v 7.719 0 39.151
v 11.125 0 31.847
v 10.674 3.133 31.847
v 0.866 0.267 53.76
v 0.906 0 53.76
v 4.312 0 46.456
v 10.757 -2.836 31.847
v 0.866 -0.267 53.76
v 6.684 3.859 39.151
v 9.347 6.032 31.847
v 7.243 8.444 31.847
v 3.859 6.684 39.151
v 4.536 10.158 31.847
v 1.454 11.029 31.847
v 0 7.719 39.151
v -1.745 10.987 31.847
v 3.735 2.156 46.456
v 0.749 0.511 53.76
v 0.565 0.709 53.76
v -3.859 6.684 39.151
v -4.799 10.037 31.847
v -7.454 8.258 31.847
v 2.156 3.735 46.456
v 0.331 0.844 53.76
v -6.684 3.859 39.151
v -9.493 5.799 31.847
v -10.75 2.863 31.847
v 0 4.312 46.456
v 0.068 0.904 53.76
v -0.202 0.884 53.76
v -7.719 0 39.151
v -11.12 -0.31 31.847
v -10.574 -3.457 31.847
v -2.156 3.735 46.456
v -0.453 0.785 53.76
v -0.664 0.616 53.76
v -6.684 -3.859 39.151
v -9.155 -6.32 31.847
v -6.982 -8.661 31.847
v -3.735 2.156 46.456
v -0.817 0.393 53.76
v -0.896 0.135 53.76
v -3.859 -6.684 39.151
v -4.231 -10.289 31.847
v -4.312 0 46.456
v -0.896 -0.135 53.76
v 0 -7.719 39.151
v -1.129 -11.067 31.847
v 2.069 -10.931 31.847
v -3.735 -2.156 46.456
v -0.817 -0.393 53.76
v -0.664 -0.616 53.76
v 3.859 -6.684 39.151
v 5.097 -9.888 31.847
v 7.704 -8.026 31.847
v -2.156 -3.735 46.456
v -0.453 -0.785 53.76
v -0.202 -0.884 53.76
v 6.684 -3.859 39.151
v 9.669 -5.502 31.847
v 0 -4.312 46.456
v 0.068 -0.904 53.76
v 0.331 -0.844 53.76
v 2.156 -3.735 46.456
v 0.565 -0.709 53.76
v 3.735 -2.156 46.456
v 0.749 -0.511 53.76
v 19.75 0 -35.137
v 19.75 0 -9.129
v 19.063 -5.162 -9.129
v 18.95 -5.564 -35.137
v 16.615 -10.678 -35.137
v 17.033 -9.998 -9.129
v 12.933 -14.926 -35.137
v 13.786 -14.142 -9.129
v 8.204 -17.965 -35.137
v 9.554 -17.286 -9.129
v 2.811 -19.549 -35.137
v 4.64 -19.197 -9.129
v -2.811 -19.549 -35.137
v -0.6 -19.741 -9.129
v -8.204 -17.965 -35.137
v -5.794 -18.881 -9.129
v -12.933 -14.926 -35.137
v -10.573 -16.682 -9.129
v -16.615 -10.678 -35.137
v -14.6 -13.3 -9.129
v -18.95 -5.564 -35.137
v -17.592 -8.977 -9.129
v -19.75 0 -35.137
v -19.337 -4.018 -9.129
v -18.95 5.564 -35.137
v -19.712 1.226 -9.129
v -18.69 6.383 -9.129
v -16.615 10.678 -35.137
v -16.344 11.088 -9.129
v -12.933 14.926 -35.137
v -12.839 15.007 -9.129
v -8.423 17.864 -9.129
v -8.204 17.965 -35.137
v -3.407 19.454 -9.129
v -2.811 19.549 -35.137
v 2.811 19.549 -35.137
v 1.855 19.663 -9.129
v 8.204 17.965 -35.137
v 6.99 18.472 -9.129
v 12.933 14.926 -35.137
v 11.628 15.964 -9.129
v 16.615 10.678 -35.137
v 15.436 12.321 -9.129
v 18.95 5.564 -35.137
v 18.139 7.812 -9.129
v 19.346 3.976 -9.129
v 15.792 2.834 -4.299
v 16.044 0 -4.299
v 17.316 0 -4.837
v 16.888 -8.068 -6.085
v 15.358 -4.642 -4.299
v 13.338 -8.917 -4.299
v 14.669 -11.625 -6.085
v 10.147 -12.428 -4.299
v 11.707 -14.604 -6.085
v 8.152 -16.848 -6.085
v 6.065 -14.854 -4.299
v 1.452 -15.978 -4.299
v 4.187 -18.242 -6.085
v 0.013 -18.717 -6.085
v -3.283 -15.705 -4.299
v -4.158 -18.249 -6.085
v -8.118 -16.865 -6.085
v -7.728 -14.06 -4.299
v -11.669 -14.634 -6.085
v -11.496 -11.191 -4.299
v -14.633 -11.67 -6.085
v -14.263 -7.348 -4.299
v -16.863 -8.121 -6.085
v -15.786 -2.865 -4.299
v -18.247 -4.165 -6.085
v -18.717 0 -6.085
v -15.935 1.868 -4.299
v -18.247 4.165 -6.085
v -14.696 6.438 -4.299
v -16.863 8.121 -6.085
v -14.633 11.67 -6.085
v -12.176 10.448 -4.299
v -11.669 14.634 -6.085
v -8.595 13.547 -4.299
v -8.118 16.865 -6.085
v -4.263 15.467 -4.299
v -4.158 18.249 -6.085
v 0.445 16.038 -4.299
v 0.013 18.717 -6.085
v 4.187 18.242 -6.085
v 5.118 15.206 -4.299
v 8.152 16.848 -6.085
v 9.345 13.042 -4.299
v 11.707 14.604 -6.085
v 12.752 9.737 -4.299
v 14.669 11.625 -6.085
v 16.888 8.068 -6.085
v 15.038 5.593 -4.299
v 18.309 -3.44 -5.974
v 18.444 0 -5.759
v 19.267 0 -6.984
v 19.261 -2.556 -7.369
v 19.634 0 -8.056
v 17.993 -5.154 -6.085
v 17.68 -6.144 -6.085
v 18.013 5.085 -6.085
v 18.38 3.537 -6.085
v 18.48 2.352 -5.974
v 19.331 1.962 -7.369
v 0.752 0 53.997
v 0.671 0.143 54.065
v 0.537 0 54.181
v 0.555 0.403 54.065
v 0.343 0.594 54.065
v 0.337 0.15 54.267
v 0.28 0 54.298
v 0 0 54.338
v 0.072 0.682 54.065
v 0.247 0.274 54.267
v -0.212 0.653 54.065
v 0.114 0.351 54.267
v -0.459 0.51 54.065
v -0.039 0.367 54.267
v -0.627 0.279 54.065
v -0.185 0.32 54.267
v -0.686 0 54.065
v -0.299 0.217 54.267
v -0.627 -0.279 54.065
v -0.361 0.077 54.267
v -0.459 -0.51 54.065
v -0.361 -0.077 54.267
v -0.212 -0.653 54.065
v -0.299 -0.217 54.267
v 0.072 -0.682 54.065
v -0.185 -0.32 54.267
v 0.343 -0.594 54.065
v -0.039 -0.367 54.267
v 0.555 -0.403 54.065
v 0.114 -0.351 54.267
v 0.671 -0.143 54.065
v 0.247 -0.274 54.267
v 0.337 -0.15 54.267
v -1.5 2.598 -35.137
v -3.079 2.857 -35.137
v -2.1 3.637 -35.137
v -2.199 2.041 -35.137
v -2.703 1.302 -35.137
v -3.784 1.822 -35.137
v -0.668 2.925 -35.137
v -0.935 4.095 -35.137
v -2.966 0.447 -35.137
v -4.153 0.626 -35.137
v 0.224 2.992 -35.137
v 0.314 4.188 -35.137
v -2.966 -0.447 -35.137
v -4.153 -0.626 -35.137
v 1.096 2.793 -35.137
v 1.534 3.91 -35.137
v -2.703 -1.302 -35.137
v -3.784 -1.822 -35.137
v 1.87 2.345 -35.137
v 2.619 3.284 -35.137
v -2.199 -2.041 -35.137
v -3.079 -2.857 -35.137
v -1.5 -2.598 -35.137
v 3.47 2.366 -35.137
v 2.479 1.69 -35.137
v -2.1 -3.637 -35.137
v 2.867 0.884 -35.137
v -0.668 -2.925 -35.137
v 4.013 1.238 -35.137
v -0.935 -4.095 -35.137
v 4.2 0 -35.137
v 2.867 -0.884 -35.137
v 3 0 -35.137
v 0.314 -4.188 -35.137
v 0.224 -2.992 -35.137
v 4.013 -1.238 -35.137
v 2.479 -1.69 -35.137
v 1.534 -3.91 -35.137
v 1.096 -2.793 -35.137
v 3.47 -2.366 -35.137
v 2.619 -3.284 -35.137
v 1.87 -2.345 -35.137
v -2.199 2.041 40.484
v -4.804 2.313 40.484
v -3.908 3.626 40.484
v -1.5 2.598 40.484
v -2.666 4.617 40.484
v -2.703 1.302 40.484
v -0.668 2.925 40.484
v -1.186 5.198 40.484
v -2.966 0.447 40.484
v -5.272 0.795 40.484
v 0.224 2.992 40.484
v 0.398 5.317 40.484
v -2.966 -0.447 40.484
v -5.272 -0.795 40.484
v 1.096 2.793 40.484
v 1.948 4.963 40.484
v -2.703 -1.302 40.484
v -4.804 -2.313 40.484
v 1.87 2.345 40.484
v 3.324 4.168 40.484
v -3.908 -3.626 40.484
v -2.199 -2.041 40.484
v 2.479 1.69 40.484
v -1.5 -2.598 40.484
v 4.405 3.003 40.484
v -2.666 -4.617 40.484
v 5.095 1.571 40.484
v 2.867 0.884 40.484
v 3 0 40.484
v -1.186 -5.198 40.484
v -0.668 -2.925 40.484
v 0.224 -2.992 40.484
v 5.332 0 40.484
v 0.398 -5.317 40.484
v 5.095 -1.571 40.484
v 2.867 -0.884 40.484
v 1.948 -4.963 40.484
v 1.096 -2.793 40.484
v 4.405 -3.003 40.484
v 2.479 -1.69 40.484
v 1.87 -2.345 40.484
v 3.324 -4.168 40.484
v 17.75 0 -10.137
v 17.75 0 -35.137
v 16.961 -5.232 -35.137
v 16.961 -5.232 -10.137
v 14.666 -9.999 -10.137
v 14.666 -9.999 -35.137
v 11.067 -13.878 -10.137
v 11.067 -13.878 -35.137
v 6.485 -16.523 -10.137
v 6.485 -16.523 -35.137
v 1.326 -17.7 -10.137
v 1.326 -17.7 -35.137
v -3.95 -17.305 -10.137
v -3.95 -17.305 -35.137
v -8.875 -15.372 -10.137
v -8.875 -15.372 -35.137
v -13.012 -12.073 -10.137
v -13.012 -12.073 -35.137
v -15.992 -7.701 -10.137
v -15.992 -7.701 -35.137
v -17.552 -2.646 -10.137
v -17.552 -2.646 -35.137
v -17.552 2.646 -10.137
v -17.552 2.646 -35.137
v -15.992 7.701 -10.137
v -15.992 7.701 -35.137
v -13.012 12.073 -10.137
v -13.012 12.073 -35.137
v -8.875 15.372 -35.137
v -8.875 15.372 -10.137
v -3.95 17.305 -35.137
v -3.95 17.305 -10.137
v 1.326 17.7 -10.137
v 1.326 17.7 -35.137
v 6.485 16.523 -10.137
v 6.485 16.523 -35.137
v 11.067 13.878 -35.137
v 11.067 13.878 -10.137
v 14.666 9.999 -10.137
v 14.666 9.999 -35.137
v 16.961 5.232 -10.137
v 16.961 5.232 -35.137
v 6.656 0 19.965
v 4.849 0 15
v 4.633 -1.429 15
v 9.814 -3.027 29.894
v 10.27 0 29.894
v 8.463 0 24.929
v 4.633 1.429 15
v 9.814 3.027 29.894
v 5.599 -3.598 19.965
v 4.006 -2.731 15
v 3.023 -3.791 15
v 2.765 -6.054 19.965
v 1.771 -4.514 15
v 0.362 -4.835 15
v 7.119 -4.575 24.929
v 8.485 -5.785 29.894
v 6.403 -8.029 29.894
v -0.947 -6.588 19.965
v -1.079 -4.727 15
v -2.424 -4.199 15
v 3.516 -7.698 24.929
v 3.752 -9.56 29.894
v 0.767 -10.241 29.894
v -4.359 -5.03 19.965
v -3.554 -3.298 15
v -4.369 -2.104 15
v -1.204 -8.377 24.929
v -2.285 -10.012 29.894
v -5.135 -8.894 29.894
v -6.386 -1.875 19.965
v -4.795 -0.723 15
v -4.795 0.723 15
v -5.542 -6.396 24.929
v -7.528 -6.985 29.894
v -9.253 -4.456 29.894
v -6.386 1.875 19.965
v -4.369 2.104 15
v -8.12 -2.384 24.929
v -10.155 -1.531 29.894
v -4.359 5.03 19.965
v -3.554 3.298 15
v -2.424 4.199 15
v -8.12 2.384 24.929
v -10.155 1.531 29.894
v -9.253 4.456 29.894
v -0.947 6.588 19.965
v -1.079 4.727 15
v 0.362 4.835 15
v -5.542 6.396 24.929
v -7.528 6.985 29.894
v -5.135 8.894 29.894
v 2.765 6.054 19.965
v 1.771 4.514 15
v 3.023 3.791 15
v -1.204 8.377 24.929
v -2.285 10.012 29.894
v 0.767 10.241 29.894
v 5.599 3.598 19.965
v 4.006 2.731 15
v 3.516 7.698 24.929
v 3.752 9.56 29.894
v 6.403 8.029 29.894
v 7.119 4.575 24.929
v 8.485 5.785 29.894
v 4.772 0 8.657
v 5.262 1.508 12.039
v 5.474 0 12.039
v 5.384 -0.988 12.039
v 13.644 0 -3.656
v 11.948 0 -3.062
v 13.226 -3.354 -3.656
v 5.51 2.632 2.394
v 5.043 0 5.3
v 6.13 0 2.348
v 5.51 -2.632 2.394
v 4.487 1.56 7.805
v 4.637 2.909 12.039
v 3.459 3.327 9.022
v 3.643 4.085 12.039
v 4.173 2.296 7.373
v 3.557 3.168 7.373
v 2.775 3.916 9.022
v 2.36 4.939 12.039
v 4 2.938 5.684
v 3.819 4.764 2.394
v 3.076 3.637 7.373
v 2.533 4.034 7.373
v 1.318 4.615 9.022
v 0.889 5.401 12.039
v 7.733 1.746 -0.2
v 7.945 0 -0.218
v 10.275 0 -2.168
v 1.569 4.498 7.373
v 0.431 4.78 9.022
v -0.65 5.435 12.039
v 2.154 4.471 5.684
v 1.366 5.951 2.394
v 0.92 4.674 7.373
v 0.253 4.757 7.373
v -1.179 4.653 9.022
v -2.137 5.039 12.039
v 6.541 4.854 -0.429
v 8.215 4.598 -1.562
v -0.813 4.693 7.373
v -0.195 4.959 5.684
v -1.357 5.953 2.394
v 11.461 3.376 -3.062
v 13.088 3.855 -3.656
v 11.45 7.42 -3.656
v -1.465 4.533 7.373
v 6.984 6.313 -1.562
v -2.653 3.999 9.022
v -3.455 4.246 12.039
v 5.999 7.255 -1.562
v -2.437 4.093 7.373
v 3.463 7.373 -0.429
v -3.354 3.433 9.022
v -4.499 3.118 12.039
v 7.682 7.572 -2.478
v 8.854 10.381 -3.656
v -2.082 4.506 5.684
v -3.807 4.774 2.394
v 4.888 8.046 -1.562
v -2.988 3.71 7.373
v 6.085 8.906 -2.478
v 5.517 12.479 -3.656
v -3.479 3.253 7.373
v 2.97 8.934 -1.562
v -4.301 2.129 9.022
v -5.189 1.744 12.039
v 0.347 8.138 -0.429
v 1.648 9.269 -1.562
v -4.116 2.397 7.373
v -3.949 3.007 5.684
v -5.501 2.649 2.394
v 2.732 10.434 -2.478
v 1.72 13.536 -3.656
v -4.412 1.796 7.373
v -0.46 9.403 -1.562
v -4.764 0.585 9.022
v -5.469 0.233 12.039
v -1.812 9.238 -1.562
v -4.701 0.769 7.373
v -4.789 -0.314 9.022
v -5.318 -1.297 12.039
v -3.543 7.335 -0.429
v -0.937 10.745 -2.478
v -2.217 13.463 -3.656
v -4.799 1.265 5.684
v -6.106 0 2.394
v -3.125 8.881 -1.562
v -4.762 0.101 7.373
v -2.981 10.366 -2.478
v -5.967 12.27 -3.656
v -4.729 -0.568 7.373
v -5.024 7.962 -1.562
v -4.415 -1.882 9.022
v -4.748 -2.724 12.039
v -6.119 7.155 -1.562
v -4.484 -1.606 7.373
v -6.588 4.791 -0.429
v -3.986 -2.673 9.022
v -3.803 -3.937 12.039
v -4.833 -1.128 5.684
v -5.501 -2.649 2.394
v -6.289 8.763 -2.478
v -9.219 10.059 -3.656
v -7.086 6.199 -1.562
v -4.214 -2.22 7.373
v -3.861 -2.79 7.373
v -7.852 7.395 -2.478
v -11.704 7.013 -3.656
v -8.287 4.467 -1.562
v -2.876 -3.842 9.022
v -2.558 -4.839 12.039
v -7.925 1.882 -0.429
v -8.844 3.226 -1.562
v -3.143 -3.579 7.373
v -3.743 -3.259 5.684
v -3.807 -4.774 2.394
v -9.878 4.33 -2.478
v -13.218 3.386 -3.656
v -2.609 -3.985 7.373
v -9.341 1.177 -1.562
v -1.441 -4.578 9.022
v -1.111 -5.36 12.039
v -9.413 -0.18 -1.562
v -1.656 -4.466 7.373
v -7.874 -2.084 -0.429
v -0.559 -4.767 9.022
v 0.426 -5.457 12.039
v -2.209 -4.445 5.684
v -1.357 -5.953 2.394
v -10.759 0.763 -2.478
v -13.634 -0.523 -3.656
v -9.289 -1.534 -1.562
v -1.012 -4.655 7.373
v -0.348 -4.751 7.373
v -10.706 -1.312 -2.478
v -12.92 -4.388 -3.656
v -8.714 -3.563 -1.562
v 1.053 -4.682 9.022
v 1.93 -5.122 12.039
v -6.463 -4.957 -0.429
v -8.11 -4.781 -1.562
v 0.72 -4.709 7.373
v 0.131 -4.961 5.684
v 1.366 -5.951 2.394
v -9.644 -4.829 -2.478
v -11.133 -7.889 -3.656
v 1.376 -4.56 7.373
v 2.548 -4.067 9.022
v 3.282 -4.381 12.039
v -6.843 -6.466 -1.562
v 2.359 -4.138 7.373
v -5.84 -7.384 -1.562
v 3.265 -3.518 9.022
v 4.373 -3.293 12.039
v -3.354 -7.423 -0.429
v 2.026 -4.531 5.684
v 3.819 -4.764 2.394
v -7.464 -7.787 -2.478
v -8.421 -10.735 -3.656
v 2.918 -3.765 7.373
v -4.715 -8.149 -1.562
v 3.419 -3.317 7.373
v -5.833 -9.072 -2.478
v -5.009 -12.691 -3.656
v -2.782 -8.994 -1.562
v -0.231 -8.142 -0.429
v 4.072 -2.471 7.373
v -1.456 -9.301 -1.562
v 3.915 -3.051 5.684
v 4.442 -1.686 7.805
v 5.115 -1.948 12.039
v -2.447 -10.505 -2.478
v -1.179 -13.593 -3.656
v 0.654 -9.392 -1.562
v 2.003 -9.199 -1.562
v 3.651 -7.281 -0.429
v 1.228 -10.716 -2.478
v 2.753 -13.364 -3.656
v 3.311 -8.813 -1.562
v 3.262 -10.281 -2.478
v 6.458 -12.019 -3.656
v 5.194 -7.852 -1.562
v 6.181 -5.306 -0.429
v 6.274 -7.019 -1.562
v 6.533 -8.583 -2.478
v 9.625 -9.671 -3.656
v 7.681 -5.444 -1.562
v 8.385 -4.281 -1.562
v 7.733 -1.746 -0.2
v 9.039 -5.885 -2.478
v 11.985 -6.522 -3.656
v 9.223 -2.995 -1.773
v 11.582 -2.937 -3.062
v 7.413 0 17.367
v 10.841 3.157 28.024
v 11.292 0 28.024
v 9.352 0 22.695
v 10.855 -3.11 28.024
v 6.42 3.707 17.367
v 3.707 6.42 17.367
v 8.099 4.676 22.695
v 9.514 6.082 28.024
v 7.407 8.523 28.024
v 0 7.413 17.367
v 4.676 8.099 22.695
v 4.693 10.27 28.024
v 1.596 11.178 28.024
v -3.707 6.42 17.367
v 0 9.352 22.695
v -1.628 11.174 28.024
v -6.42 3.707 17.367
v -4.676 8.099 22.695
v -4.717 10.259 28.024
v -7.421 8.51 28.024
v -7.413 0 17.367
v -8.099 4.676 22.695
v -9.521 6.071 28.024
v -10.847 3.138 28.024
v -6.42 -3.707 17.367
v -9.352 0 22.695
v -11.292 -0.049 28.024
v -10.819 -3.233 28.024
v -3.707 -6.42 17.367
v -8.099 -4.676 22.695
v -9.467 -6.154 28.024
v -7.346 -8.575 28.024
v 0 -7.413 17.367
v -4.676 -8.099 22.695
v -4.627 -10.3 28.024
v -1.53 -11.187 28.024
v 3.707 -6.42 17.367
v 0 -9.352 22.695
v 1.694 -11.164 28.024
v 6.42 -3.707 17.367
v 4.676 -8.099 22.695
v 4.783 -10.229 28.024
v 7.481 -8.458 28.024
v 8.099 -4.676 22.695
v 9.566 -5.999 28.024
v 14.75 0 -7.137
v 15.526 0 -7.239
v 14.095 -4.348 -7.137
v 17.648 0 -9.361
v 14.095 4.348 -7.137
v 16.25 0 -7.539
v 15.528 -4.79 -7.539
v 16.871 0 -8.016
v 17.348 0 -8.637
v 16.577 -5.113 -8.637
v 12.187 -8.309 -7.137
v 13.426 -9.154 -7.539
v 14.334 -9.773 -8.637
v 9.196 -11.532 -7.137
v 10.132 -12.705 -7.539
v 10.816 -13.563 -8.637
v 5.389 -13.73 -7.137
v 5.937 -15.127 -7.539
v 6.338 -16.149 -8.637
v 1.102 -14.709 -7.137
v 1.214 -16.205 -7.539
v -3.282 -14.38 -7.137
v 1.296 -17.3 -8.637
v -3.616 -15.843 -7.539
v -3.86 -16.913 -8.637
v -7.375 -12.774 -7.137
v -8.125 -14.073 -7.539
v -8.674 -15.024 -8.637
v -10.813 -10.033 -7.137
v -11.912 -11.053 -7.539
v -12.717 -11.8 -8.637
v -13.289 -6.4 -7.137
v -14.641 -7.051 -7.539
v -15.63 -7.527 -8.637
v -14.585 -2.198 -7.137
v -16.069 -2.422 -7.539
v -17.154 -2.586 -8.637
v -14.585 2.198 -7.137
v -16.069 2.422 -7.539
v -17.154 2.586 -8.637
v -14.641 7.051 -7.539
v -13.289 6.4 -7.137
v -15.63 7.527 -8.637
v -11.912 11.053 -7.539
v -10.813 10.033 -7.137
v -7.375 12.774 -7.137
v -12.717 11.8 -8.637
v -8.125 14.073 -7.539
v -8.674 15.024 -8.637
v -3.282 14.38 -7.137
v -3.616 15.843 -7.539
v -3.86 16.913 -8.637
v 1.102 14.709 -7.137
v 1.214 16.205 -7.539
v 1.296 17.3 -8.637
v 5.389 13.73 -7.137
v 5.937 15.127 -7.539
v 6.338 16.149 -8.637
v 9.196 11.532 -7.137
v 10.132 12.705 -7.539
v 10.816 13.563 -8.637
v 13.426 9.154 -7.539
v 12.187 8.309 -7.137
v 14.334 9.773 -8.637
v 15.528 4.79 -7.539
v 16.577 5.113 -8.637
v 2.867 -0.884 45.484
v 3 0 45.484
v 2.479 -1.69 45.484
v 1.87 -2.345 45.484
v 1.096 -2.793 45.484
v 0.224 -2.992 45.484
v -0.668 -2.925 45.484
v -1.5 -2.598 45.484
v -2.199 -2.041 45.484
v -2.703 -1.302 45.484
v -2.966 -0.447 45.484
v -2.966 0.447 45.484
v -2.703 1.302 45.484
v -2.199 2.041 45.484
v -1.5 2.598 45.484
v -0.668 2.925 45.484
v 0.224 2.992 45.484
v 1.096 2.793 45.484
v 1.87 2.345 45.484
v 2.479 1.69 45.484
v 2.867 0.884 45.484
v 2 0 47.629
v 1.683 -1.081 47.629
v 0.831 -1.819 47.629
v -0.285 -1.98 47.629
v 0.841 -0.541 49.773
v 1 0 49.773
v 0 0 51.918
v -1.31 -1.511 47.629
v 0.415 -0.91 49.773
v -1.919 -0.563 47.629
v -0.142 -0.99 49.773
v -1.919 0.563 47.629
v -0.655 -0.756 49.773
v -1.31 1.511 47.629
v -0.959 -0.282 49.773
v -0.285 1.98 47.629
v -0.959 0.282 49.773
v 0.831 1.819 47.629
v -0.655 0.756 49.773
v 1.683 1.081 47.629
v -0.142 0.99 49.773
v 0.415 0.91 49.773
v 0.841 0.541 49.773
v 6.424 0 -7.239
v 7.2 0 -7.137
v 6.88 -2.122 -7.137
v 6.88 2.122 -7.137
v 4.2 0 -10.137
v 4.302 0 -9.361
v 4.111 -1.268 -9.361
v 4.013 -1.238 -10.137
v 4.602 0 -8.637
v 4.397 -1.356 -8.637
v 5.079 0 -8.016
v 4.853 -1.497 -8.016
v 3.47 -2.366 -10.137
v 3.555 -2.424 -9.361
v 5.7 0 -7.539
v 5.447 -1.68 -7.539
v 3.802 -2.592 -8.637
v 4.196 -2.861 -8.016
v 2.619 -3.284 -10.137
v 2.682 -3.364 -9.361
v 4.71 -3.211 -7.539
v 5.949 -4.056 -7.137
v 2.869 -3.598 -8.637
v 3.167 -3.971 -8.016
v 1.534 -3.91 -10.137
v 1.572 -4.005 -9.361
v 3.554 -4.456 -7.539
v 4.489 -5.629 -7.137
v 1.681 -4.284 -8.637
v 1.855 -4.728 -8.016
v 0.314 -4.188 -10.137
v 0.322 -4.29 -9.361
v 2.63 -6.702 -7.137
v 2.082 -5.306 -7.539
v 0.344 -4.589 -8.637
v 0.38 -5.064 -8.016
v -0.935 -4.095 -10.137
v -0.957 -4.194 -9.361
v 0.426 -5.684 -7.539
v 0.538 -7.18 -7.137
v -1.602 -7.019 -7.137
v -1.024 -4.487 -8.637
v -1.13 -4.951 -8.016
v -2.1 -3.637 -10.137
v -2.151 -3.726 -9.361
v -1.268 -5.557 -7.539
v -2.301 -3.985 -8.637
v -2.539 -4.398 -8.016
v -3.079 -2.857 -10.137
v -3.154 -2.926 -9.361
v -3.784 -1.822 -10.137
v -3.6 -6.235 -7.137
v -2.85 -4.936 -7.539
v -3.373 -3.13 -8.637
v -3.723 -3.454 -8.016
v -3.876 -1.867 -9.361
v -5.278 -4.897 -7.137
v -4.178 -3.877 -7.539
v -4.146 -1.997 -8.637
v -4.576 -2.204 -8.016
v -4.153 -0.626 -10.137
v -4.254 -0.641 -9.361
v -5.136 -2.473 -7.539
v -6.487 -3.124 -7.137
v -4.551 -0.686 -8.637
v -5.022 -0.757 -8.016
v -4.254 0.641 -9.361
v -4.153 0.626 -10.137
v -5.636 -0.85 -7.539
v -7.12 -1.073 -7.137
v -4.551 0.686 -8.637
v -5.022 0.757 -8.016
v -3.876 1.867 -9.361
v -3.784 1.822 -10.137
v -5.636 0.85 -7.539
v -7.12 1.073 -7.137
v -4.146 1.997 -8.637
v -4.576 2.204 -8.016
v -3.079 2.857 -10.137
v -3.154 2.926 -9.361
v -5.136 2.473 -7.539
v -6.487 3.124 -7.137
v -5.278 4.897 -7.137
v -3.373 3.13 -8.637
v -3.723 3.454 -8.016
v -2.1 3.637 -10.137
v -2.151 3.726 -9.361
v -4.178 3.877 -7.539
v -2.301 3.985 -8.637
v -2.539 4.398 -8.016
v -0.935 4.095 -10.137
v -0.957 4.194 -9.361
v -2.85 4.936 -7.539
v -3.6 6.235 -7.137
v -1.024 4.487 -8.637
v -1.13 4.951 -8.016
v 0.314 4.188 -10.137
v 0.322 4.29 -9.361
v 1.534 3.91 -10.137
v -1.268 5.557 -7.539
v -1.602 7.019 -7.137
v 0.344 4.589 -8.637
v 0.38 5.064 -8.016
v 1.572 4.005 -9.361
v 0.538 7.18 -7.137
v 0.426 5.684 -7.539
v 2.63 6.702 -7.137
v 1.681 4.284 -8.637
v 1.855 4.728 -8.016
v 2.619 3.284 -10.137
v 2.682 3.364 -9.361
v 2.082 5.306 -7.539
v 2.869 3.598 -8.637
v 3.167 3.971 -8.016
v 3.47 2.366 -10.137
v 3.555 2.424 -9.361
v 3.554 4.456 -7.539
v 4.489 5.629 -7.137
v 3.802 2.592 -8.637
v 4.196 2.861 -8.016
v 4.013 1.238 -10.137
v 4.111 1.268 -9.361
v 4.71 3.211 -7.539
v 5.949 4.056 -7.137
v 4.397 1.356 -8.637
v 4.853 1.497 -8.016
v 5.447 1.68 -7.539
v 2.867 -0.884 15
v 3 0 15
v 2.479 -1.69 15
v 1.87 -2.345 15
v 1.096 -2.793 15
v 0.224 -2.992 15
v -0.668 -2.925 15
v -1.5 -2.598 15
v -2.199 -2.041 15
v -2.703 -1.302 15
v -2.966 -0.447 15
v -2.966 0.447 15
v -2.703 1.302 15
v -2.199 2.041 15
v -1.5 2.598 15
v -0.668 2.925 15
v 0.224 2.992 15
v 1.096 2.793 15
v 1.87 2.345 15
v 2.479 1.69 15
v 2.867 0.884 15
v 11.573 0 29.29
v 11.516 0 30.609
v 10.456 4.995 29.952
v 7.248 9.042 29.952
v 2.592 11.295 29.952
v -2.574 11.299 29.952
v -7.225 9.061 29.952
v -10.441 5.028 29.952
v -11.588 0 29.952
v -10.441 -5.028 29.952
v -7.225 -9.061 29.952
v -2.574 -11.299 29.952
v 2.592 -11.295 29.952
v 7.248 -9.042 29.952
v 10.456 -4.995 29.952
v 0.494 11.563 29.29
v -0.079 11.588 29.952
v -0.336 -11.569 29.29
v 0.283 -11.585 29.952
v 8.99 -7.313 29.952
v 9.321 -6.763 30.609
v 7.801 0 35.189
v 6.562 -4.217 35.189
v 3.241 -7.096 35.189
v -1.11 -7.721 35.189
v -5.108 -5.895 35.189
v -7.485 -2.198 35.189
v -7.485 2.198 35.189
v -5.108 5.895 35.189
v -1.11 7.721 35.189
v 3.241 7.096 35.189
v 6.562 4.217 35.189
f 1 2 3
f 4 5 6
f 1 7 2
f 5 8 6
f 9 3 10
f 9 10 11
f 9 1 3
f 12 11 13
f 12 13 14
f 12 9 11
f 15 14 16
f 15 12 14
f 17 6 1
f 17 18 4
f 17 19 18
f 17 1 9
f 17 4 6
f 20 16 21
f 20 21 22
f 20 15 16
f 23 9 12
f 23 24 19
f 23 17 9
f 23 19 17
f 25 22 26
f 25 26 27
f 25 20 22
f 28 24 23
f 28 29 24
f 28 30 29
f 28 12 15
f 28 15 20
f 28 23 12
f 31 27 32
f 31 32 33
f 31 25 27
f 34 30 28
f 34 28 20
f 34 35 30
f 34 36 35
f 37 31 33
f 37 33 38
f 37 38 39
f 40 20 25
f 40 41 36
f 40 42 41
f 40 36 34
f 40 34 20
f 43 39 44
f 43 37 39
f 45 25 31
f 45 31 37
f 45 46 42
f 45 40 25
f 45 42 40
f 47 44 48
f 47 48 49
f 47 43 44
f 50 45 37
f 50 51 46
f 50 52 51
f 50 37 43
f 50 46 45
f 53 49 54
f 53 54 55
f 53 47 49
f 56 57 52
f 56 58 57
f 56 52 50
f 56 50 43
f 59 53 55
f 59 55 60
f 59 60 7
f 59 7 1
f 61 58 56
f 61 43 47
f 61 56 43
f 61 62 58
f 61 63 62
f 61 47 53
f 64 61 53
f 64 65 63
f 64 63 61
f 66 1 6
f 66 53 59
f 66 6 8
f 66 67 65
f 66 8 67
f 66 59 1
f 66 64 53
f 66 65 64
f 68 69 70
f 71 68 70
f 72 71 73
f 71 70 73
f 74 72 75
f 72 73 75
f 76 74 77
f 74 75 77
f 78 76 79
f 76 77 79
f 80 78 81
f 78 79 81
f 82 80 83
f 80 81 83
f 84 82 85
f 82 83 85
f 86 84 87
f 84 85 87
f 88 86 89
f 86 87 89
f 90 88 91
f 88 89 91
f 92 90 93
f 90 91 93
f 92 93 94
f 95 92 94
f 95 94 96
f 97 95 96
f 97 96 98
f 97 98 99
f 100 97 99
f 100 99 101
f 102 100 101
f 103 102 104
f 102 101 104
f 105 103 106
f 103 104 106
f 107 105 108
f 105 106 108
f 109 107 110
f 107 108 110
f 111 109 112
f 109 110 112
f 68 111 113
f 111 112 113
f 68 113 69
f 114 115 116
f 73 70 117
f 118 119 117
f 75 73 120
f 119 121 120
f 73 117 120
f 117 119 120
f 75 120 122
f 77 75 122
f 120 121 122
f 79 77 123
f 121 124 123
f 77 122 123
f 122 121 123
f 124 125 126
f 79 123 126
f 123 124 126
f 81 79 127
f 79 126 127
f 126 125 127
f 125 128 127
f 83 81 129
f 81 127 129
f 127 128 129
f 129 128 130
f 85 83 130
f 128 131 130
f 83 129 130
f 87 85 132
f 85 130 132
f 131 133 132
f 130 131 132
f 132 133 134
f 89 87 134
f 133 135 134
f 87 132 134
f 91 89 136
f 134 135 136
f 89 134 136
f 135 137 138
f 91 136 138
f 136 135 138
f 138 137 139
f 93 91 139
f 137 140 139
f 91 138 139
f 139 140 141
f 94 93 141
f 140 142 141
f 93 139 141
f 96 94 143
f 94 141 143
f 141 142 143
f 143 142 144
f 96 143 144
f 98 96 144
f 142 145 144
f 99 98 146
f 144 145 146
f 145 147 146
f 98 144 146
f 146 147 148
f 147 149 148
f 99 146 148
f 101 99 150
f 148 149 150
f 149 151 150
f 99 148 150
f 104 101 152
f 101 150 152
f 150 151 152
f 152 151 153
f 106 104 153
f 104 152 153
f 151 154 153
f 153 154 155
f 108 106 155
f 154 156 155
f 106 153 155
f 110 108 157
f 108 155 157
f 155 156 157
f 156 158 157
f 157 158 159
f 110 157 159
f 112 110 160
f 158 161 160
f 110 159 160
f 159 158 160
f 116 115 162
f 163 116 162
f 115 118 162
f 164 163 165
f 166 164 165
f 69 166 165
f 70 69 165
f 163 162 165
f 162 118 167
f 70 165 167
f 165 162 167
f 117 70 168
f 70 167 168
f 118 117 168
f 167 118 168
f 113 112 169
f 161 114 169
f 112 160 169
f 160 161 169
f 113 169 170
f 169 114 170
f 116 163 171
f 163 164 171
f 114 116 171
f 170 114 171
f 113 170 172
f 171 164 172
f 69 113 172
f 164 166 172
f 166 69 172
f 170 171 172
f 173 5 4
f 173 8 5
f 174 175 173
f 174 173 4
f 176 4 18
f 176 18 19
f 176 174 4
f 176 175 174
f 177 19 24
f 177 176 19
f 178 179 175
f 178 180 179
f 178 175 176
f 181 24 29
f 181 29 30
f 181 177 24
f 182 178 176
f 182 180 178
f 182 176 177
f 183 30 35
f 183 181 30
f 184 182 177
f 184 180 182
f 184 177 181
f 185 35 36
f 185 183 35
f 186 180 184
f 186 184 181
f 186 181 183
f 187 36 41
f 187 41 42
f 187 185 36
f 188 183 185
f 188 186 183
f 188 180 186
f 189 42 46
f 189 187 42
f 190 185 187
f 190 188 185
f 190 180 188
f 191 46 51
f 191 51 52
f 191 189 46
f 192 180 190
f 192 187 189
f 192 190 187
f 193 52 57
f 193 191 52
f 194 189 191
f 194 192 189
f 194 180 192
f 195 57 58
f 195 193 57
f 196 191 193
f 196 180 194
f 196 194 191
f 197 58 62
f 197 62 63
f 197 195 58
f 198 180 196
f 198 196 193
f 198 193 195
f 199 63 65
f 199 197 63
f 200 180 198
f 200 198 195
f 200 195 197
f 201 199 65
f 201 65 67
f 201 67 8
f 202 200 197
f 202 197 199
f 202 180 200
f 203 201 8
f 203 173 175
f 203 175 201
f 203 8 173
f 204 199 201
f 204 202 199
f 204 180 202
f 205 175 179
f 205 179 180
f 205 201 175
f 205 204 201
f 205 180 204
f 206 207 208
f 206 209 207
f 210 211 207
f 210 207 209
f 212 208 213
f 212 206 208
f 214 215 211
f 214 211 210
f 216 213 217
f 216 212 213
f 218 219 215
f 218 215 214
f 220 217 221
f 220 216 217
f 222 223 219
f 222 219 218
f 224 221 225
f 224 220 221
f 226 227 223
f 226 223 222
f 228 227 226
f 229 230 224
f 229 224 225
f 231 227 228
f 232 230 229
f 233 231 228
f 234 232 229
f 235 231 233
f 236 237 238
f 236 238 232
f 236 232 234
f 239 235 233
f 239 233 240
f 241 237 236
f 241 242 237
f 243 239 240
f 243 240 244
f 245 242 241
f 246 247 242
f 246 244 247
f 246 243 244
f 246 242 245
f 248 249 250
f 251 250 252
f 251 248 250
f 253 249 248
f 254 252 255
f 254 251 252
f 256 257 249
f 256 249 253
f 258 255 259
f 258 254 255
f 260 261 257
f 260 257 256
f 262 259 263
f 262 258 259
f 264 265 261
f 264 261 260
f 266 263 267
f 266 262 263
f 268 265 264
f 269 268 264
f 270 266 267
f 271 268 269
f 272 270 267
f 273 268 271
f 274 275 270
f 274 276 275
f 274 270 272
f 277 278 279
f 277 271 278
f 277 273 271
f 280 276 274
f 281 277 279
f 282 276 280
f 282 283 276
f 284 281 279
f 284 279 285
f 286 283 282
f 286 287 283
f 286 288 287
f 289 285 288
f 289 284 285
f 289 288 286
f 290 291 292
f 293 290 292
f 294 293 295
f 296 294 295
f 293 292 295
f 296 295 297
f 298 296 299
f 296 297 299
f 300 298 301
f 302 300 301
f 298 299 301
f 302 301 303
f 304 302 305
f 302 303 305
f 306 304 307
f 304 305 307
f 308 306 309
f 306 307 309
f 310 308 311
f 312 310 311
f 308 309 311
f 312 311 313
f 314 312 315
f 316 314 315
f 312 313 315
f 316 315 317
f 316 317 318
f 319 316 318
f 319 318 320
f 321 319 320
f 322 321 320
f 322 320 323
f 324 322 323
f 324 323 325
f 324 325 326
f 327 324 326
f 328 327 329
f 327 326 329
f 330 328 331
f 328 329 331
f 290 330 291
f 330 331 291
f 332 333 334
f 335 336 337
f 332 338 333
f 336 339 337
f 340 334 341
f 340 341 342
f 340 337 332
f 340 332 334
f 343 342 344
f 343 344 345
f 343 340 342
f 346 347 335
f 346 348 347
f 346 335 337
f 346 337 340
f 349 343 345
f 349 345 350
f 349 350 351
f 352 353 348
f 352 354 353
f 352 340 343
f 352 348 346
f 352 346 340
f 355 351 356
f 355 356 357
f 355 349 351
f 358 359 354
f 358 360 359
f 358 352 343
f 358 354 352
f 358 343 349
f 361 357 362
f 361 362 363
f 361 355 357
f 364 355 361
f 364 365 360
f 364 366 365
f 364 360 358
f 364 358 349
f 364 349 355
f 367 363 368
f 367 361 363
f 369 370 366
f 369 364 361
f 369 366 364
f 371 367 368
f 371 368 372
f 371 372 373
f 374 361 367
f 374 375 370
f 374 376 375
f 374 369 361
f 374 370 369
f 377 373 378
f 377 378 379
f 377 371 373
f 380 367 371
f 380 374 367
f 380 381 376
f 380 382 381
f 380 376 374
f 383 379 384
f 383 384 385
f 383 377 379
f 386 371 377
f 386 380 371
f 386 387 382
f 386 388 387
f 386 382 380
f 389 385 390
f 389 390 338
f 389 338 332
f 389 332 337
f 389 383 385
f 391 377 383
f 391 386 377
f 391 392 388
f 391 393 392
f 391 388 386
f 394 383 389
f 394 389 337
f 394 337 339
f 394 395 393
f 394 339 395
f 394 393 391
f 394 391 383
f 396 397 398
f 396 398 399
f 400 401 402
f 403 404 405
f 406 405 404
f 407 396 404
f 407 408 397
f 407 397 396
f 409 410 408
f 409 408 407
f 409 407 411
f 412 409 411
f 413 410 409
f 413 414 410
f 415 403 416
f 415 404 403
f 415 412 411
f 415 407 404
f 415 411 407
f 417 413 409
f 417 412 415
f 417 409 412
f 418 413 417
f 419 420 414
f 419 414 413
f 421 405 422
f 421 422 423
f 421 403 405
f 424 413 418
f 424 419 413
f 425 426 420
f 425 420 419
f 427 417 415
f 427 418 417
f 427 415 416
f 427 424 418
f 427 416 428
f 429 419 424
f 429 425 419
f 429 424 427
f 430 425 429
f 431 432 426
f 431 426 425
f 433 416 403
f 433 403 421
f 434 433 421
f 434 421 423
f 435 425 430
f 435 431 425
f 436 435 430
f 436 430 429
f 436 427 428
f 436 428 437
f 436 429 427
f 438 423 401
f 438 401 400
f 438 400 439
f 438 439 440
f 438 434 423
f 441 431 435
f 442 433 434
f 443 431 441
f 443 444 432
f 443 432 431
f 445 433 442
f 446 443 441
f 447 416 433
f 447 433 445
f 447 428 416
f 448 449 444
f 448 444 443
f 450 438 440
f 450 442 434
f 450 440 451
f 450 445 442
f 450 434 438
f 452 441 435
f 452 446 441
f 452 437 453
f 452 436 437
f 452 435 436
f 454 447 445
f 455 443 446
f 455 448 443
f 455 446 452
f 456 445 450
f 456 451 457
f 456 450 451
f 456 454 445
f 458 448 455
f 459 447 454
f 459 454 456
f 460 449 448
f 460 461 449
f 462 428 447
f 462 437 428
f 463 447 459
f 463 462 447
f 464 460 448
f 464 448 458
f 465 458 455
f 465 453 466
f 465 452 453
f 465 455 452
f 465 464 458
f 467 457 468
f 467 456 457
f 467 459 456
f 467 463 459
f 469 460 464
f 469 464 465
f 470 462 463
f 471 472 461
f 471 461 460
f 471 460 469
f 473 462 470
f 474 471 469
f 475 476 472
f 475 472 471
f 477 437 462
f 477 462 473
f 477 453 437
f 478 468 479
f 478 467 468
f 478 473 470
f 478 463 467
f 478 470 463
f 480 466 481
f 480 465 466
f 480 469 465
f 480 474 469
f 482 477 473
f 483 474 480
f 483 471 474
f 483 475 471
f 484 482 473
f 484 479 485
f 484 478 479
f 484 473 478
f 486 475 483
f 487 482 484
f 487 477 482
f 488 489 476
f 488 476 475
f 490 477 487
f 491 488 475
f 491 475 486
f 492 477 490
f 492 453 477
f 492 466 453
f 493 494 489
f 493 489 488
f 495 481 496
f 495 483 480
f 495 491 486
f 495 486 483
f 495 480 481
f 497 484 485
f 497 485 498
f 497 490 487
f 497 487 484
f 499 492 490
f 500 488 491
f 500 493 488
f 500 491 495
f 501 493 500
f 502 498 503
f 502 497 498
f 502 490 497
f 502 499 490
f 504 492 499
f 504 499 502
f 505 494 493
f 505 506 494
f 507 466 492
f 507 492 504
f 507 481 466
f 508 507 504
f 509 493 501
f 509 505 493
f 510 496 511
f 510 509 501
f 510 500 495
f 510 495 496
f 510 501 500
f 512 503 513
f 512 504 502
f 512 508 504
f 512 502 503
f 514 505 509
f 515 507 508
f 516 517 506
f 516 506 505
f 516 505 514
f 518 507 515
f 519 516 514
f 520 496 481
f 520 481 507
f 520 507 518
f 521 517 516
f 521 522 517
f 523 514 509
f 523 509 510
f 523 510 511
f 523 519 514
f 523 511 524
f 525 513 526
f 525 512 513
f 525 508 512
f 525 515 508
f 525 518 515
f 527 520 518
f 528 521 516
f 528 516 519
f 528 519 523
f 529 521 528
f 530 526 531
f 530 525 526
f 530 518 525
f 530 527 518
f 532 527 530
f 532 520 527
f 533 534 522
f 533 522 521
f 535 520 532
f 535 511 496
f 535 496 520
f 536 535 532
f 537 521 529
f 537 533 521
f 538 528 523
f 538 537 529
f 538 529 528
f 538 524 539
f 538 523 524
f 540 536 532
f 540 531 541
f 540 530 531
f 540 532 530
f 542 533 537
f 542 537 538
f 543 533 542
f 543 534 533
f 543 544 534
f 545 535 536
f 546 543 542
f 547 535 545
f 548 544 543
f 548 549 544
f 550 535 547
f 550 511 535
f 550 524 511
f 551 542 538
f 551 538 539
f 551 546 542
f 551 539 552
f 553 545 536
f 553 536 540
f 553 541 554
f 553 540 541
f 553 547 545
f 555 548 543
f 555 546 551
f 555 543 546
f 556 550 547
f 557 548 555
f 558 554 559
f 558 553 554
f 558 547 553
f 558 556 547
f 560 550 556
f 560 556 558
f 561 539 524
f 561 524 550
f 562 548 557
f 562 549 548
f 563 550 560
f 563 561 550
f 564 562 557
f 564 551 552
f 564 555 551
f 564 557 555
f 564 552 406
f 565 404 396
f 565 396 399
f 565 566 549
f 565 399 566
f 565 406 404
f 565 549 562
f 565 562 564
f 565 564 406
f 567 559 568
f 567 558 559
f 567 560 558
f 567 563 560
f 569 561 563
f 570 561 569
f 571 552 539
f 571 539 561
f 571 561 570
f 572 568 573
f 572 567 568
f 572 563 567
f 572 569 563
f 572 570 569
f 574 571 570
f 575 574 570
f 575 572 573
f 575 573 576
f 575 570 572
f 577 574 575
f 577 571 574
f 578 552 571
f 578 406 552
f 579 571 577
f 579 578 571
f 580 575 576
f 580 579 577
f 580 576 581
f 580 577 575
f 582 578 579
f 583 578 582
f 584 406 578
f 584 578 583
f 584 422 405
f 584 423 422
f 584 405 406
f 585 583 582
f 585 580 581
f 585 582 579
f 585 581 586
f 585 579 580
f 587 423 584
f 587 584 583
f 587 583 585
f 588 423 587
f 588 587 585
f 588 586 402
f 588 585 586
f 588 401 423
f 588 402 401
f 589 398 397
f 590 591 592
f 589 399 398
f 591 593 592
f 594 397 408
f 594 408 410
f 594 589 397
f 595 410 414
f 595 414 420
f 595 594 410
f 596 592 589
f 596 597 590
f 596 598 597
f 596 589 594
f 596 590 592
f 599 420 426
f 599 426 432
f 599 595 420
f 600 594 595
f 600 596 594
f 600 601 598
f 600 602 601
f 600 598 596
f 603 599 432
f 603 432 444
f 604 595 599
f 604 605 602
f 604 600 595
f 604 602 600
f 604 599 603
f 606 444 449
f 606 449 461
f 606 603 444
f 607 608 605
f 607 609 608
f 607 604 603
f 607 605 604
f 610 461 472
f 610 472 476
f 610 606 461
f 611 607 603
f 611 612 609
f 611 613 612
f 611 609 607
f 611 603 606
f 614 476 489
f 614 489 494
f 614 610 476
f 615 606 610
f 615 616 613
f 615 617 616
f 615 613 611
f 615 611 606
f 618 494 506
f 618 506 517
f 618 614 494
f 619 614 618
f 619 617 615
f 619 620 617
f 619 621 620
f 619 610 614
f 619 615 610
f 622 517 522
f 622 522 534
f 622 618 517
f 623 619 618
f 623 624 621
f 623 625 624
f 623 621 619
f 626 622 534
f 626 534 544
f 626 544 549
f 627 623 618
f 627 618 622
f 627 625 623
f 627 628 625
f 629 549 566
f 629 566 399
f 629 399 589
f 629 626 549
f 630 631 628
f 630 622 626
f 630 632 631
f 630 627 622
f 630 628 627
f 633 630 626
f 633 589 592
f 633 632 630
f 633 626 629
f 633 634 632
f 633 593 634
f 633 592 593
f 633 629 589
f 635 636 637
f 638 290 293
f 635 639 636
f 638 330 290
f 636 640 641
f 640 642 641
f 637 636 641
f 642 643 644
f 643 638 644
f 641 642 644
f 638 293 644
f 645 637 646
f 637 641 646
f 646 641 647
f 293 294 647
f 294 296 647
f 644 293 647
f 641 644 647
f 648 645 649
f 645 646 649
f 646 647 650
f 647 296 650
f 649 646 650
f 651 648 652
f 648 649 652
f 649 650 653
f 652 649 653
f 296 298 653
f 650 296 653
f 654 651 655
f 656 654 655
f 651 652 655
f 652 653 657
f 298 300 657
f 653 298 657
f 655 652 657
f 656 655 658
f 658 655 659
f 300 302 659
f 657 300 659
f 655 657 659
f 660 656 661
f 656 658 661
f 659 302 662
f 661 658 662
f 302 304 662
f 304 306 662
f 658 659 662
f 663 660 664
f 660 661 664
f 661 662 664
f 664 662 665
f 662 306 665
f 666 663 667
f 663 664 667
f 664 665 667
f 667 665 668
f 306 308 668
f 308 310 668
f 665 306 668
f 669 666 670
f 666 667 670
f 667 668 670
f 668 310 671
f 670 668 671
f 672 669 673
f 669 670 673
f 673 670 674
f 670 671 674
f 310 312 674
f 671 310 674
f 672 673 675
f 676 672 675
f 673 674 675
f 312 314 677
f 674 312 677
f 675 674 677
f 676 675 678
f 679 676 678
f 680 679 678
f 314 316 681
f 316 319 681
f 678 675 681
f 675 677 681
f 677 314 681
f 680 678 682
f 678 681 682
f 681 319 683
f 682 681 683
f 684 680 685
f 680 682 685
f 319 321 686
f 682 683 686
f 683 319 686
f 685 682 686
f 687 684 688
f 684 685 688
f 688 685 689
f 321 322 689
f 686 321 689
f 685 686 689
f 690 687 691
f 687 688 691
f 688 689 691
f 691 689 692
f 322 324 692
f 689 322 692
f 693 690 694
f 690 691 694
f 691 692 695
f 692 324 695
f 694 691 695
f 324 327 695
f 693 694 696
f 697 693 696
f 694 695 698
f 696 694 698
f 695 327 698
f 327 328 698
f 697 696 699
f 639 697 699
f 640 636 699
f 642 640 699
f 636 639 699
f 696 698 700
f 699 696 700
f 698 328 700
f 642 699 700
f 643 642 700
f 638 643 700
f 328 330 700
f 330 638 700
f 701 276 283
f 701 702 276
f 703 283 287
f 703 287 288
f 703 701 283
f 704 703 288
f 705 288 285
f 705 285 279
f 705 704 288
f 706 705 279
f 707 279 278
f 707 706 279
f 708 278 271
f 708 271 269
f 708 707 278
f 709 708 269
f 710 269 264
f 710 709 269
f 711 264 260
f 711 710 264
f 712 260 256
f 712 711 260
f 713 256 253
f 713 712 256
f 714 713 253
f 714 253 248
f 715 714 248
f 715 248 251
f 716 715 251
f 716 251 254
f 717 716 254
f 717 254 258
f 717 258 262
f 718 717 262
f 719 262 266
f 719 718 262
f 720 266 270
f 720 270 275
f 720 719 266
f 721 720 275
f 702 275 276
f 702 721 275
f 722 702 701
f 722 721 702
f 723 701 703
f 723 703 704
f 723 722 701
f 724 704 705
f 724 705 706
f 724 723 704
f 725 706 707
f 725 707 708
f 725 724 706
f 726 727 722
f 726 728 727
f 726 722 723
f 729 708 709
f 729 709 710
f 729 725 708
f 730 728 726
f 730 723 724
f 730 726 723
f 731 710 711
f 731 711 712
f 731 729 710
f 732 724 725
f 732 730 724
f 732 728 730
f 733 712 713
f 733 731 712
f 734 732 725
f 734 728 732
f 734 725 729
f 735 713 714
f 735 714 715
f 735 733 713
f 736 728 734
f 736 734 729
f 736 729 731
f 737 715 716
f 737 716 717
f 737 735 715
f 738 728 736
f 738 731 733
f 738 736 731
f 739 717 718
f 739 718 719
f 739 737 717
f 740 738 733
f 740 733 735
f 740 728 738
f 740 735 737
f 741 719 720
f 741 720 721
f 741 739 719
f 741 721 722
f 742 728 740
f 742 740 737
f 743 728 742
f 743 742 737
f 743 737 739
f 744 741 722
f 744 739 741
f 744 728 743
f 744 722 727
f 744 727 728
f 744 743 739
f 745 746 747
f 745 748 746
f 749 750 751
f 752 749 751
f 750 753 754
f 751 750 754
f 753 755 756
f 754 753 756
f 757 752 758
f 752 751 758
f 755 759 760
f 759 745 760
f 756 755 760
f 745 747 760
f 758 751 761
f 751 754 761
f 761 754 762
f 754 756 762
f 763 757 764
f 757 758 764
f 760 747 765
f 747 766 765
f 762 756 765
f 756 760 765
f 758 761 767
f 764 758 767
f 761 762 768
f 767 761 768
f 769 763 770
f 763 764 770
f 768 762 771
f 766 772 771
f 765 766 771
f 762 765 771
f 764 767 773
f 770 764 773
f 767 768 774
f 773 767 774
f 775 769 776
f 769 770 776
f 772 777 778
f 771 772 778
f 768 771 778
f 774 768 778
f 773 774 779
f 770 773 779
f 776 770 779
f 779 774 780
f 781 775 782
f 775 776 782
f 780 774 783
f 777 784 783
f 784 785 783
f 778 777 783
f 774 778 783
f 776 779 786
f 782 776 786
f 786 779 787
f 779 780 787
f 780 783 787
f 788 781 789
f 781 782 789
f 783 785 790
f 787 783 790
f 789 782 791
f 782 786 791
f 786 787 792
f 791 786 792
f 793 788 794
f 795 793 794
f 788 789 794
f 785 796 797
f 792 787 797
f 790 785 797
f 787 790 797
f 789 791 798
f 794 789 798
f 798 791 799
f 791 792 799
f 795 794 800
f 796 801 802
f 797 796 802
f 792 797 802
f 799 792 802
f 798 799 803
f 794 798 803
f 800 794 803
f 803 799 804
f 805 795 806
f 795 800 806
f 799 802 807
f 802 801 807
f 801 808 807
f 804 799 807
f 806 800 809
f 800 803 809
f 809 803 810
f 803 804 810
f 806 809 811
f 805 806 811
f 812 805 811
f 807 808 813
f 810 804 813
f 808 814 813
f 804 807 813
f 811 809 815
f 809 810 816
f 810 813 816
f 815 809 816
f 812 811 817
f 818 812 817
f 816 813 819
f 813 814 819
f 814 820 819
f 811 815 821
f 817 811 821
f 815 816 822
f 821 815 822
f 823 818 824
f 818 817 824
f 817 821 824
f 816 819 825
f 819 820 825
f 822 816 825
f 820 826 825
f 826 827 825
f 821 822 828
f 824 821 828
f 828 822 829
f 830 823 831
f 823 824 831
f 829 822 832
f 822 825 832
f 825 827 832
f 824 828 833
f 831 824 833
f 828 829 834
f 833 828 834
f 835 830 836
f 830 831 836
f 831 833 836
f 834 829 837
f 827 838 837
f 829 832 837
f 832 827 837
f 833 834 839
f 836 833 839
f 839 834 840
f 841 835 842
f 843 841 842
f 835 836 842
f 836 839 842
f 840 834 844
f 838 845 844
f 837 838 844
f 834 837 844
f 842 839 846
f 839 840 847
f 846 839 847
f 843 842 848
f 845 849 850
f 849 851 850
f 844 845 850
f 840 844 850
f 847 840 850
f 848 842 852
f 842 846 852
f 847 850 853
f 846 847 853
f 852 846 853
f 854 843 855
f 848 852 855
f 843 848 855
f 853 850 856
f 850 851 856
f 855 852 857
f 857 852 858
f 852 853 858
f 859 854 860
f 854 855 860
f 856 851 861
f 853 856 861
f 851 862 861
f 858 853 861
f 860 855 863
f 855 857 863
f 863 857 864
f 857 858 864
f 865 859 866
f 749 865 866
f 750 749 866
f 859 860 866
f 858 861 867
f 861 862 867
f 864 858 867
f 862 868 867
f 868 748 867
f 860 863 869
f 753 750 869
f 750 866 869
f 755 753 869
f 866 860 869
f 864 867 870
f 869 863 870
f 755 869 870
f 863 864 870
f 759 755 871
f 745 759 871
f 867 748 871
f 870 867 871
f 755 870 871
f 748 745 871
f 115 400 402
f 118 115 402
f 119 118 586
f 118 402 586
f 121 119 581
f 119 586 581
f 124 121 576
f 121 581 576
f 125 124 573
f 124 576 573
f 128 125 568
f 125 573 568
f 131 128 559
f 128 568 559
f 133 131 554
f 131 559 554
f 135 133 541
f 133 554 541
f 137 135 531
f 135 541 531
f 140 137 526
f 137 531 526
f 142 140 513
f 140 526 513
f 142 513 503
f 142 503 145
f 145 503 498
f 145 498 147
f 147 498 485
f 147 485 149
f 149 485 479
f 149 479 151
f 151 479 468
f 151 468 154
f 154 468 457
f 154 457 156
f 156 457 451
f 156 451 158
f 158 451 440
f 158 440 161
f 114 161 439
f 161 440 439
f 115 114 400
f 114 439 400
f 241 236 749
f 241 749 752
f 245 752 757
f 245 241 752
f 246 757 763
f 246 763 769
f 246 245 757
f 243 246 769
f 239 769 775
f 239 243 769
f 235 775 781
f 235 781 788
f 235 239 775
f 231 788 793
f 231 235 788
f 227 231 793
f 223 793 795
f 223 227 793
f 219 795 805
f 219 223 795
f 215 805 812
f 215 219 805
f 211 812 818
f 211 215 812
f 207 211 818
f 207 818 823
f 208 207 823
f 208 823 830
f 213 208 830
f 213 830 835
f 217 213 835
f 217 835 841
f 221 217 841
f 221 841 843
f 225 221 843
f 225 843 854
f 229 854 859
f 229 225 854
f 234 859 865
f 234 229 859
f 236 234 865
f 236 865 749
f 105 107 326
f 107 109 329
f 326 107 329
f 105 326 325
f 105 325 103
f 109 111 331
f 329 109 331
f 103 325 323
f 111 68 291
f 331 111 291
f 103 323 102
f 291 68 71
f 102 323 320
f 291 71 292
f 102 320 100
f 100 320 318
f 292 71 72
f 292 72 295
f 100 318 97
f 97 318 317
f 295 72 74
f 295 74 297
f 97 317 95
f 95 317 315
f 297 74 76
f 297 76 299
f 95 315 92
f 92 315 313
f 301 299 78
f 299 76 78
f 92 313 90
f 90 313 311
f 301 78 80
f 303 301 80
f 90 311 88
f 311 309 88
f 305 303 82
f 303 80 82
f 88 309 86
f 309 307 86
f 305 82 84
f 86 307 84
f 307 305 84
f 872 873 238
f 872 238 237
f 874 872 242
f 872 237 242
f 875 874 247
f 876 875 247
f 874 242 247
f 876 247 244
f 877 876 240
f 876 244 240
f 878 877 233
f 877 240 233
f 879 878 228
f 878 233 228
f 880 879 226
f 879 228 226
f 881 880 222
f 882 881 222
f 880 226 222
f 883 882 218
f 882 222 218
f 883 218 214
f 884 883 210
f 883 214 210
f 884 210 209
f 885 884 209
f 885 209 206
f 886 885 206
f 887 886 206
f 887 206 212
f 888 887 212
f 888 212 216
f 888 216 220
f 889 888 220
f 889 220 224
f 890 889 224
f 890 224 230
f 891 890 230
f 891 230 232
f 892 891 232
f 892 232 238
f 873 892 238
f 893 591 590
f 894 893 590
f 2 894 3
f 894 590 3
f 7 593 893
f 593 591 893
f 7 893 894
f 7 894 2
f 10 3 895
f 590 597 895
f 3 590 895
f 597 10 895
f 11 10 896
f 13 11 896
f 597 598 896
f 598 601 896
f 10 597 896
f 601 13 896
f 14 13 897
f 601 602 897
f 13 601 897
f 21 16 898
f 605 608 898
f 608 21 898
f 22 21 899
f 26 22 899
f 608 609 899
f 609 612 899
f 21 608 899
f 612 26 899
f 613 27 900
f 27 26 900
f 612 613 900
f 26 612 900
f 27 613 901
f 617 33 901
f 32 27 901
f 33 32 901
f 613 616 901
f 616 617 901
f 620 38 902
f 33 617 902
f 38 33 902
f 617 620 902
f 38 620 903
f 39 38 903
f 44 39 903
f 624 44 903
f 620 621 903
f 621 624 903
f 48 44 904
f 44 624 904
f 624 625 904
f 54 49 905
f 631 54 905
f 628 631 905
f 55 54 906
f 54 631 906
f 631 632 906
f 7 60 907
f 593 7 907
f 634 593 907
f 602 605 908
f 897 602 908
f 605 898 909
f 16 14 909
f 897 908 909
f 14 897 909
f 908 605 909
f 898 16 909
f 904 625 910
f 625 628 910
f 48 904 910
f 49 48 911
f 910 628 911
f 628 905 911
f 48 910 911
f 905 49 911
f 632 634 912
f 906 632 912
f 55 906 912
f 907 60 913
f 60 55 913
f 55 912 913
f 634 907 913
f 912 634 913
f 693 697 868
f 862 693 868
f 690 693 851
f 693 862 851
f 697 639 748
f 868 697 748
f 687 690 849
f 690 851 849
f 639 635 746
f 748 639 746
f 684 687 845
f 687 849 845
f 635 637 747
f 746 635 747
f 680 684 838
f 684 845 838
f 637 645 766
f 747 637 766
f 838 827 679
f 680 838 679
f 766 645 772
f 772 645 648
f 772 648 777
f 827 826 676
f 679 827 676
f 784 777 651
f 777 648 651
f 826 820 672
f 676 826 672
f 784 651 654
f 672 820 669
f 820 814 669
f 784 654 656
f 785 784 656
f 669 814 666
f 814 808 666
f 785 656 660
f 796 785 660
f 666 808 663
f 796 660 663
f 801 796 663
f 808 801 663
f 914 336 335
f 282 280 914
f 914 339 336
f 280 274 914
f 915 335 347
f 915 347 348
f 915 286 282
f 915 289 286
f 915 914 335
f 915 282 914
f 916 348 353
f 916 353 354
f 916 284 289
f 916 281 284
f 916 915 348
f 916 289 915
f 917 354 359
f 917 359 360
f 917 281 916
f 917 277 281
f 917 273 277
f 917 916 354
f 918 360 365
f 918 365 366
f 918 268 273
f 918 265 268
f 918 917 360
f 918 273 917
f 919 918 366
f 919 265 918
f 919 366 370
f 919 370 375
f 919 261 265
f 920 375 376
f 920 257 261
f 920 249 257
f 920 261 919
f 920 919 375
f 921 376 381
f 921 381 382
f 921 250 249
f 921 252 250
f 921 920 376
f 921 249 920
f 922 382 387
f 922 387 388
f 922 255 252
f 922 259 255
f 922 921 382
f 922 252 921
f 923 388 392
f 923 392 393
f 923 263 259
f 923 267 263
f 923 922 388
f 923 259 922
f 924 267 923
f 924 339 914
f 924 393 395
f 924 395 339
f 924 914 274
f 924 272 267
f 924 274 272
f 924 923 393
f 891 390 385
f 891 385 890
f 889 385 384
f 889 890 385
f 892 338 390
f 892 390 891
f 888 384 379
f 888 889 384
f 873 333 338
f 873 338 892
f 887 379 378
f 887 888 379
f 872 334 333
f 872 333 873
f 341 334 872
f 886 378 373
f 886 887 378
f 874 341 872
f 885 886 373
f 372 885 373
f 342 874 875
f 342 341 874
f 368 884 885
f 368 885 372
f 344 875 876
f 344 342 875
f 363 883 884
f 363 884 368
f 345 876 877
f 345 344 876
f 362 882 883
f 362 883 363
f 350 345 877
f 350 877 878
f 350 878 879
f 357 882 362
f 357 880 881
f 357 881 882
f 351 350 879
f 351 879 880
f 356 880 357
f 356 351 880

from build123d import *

# Parameters (mm, degrees)
F5_R      = 12
F6_R      = 5
F9_R      = 4.2
F9_R_2    = 3
F10_DEPTH = 28
F11_R     = 3


with BuildPart() as f2:
    # F0 (on Front) → F2 (revolve)
    with BuildSketch(Plane.XZ):
        Polygon((17.75, -7.1372333806), (17.75, -35.1372333806), (19.75, -35.1372333806), (19.75, -5.2919965505), (0, 0), (0, -7.1372333806), align=None)
    revolve(axis=Axis((0, 0, -15.6453922391), (0, 0, -1)))

    # F3 (on Front) → F4 (revolve)
    with BuildSketch(Plane.XZ):
        with BuildLine():
            Line((0, 54.3376104964), (0, -3))
            Line((0, -3), (12, 29.9697290335))
            Line((12, 29.9697290335), (0.906307787, 53.7602287582))
            ThreePointArc((0.906307787, 53.7602287582), (0.5372996083, 54.1810019422), (0, 54.3376104964))
        make_face()
    revolve(axis=Axis((0, 0, 25.6688052482), (0, 0, 1)))

    # F5
    f5_edges = [f2.edges().sort_by_distance(p)[0] for p in [
        (-0.994884, 0, -0.266578),
    ]]
    fillet(f5_edges, radius=F5_R)

    # F6
    f6_edges = [f2.edges().sort_by_distance(p)[0] for p in [
        (-12, 0, 29.969729),
        (-19.75, 0, -5.291997),
    ]]
    fillet(f6_edges, radius=F6_R)

    # F7 (on Front) → F8 (revolve, cut)
    with BuildSketch(Plane.XZ):
        Polygon((3, 45.484368785), (0, 51.9178895465), (0, -35.1372333806), (3, -35.1372333806), (3, 15), (4.8487797808, 15), (10.2698207956, 29.894187778), (5.3315382908, 40.484368785), (3, 40.484368785), align=None)
    revolve(axis=Axis((0, 0, -15.6453922391), (0, 0, -1)), mode=Mode.SUBTRACT)

    # F9 (on face) → F10 (join, through all)
    with BuildSketch(Plane(origin=(0, 0, -35.1372333806), x_dir=(1, 0, 0), z_dir=(0, 0, -1))):
        Circle(F9_R)
        Circle(F9_R_2, mode=Mode.SUBTRACT)
    extrude(amount=-F10_DEPTH)

    # F11
    f11_edges = [f2.edges().sort_by_distance(p)[0] for p in [
        (-17.75, 0, -7.137233),
        (-4.2, 0, -7.137233),
    ]]
    fillet(f11_edges, radius=F11_R)


solid = f2.part
